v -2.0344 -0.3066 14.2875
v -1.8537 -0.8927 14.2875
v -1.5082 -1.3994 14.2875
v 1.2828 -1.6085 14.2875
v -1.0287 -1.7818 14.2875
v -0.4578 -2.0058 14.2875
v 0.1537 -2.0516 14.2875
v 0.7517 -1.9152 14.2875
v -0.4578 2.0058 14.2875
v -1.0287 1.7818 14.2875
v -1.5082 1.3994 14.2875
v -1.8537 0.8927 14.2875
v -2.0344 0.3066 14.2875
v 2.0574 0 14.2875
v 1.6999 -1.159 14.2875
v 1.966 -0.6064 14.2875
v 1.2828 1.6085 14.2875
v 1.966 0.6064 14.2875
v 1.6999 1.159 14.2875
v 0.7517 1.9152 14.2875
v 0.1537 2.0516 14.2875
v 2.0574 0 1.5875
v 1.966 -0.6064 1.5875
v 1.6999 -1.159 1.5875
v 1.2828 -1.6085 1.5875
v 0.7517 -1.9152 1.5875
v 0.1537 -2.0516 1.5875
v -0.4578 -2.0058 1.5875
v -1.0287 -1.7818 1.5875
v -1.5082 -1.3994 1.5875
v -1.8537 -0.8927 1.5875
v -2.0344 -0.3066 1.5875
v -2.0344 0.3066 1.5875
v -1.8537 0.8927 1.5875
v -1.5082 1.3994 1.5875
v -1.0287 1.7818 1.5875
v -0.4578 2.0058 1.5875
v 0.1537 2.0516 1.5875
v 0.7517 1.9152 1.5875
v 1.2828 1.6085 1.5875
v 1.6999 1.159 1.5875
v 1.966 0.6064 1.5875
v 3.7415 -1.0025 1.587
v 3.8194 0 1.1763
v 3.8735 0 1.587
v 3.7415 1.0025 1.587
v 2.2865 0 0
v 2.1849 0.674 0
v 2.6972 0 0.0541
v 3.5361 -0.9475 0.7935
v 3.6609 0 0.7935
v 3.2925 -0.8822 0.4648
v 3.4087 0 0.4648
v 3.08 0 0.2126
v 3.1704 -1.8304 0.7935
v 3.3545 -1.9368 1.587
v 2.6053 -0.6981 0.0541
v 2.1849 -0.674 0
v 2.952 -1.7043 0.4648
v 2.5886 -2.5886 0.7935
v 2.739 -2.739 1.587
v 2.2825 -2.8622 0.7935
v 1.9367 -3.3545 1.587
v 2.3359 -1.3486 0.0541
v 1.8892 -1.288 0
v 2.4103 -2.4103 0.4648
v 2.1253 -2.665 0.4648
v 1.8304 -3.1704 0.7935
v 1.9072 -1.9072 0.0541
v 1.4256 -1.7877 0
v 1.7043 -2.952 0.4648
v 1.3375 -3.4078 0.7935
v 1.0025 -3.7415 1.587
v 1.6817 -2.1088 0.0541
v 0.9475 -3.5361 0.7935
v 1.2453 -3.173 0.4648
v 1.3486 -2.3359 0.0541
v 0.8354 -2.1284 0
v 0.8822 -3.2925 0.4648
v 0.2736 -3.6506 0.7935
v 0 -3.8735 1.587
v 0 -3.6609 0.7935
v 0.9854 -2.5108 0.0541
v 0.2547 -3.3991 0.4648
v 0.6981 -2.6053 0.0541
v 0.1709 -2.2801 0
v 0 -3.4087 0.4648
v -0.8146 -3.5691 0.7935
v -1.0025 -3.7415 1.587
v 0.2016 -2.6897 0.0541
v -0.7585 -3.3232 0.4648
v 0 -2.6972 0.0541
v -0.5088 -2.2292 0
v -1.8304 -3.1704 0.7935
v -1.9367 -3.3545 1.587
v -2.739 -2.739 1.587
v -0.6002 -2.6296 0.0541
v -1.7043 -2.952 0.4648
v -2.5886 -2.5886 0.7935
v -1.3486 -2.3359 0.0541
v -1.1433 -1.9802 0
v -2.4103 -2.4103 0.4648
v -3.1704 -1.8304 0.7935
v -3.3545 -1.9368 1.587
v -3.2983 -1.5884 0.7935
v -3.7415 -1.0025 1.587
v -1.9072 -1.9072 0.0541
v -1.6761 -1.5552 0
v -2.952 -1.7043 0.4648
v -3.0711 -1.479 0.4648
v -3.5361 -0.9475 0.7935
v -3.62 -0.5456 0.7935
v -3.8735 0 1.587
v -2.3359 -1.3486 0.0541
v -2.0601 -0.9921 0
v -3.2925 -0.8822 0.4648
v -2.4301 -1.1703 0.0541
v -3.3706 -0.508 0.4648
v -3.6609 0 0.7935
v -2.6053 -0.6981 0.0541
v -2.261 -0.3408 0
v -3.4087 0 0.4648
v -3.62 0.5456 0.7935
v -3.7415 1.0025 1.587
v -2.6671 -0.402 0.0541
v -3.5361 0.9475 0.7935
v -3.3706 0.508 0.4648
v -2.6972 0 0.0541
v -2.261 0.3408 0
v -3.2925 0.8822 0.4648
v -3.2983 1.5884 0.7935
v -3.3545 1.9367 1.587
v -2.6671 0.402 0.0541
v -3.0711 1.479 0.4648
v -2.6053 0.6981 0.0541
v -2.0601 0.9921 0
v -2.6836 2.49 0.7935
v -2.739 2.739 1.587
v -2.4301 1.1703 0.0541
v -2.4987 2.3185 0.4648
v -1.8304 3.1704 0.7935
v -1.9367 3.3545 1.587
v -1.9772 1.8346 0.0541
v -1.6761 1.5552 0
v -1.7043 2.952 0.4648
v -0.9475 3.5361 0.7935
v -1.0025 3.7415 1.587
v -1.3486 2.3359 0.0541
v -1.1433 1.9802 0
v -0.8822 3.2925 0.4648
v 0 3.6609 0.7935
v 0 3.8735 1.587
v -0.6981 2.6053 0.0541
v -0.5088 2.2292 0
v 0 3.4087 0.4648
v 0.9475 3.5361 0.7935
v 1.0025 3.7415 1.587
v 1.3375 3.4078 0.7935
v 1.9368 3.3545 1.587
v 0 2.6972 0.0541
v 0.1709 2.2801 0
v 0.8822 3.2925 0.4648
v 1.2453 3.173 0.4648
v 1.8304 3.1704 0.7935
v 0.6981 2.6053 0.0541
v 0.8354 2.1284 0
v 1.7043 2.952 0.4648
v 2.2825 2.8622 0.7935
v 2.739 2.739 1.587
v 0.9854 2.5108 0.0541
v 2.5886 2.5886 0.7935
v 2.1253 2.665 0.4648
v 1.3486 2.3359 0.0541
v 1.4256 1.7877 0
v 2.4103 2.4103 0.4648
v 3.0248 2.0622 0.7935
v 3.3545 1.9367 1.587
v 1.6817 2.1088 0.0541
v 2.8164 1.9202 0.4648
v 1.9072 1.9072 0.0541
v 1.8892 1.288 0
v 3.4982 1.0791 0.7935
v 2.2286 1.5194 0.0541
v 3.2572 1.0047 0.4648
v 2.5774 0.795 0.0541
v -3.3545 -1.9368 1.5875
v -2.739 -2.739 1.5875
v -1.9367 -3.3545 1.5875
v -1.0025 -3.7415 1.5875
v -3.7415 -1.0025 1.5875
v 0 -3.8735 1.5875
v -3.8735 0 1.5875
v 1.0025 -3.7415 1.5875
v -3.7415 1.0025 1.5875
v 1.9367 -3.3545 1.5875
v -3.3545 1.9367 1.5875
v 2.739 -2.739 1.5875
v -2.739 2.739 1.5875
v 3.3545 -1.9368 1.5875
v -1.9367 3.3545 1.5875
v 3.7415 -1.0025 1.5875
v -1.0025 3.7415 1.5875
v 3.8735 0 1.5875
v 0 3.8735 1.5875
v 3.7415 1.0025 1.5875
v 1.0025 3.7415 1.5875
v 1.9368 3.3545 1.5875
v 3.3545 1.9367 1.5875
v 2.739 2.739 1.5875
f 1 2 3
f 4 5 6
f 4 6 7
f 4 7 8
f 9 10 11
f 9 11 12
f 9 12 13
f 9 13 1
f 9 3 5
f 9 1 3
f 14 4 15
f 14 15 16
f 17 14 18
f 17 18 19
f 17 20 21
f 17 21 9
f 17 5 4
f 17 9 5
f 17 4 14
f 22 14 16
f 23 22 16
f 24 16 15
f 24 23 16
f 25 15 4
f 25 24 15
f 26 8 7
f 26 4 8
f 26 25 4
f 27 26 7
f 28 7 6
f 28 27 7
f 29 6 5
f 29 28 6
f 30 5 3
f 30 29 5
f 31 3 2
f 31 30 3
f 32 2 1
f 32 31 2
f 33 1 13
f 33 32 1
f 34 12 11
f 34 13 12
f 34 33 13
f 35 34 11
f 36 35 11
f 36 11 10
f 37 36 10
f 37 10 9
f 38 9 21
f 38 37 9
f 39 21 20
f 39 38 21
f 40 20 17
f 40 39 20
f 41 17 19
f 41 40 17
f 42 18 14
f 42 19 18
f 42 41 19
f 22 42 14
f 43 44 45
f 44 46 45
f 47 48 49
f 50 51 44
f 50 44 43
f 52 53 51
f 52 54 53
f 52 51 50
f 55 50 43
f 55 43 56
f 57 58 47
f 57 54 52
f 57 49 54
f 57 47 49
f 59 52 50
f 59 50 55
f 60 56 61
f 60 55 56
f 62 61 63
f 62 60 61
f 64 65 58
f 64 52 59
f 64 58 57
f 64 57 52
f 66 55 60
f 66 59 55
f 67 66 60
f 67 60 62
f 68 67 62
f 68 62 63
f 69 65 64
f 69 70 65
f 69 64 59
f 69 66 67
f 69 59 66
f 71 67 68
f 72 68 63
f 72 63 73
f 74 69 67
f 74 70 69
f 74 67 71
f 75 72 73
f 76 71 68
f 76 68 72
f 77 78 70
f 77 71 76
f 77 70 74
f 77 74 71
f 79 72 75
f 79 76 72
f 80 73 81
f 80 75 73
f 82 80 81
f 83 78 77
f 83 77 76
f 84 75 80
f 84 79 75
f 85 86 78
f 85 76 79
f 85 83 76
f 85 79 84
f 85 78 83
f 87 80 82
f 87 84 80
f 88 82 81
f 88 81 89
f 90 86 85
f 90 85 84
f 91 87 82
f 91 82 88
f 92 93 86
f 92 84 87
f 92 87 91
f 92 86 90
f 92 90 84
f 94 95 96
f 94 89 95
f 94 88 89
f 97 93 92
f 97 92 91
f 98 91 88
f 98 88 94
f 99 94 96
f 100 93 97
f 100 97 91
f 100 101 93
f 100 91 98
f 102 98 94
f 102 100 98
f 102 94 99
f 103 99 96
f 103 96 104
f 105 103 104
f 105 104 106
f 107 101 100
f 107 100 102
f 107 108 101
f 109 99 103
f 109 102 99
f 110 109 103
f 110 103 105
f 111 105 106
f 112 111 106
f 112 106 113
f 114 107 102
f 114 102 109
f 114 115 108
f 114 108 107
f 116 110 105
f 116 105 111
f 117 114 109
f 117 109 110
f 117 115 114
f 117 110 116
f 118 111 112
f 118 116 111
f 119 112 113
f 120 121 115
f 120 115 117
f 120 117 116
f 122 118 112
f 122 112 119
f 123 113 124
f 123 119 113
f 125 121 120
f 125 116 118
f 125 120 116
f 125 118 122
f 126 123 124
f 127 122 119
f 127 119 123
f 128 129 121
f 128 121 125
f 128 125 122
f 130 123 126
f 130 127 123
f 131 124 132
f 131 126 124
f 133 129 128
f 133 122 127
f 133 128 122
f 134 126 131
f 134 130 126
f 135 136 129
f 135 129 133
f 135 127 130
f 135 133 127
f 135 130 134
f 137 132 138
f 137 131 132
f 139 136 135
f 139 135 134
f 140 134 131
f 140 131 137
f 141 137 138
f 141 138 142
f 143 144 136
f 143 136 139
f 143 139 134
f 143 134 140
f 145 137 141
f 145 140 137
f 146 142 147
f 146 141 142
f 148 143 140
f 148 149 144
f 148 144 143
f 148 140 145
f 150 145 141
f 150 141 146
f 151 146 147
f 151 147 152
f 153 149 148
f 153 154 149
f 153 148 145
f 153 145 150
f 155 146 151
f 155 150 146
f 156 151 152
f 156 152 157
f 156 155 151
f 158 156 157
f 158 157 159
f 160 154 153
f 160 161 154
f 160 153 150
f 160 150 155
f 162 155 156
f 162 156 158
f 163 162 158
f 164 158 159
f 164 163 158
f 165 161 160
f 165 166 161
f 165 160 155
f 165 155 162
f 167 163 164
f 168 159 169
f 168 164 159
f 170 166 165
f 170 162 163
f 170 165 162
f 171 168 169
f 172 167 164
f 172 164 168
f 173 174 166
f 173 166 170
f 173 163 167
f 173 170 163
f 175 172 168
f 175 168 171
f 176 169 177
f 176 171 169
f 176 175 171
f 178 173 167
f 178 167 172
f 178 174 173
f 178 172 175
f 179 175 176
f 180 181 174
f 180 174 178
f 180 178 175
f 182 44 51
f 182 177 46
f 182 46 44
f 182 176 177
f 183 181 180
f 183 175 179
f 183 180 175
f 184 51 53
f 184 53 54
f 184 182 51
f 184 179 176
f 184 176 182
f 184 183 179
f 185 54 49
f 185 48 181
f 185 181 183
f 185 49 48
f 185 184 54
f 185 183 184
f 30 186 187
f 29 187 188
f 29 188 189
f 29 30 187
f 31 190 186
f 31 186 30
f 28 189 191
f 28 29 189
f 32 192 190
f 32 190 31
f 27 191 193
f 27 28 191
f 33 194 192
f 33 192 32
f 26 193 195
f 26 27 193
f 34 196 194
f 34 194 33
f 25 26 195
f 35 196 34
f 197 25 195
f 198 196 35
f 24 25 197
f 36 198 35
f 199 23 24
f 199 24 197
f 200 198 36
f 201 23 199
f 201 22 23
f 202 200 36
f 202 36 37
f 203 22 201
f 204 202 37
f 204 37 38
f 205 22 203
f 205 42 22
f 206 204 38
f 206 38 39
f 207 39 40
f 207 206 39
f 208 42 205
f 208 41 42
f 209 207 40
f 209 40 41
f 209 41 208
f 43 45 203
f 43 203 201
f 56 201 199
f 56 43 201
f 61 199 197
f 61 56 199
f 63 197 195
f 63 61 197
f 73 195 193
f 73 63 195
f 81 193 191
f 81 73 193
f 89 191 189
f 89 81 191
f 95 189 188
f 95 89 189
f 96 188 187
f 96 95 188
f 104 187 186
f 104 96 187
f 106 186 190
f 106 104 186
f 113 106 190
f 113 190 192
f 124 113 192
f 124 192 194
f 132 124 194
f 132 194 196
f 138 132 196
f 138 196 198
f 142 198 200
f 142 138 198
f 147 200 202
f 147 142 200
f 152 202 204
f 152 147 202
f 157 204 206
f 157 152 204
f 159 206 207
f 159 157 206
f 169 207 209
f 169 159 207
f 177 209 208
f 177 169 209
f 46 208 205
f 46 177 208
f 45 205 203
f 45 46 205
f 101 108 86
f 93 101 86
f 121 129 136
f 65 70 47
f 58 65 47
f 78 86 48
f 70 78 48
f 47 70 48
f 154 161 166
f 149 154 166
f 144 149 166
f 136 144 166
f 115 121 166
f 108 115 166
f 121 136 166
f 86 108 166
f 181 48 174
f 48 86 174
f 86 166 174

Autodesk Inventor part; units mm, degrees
ref_plane "YZ Plane" through (0, 0, 0) normal (1, 0, 0) x (0, 1, 0)
ref_plane "XZ Plane" through (0, 0, 0) normal (0, 1, 0) x (-1, 0, 0)
ref_plane "XY Plane" through (0, 0, 0) normal (0, 0, 1) x (1, 0, 0)
sketch "Sketch1" plane through (0, 0, 0) normal (0, 0, 1) x (1, 0, 0)
  circle A0 centre (0, 0) radius 3.8735
  dimension "d0" = 7.747
extrude "Extrusion1" add sketch "Sketch1" along normal blind 1.5875
fillet "Fillet1" radius 1.5875 1 edges at (-3.8735, 0, 0)
sketch "Sketch2" plane through (0, 0, 1.5875) normal (0, 0, 1) x (1, 0, 0)
  circle A0 centre (0, 0) radius 3.8735 projected
  circle A1 centre (0, 0) radius 2.0574
  dimension "d4" = 4.1148
extrude "Extrusion2" add sketch "Sketch2" along normal blind 12.7 contours A1
thread "Thread1" size "8-32 UNC" class "2A" standard "ANSI Unified Screw Threads" full length
properties part number "8-32 Screw"
